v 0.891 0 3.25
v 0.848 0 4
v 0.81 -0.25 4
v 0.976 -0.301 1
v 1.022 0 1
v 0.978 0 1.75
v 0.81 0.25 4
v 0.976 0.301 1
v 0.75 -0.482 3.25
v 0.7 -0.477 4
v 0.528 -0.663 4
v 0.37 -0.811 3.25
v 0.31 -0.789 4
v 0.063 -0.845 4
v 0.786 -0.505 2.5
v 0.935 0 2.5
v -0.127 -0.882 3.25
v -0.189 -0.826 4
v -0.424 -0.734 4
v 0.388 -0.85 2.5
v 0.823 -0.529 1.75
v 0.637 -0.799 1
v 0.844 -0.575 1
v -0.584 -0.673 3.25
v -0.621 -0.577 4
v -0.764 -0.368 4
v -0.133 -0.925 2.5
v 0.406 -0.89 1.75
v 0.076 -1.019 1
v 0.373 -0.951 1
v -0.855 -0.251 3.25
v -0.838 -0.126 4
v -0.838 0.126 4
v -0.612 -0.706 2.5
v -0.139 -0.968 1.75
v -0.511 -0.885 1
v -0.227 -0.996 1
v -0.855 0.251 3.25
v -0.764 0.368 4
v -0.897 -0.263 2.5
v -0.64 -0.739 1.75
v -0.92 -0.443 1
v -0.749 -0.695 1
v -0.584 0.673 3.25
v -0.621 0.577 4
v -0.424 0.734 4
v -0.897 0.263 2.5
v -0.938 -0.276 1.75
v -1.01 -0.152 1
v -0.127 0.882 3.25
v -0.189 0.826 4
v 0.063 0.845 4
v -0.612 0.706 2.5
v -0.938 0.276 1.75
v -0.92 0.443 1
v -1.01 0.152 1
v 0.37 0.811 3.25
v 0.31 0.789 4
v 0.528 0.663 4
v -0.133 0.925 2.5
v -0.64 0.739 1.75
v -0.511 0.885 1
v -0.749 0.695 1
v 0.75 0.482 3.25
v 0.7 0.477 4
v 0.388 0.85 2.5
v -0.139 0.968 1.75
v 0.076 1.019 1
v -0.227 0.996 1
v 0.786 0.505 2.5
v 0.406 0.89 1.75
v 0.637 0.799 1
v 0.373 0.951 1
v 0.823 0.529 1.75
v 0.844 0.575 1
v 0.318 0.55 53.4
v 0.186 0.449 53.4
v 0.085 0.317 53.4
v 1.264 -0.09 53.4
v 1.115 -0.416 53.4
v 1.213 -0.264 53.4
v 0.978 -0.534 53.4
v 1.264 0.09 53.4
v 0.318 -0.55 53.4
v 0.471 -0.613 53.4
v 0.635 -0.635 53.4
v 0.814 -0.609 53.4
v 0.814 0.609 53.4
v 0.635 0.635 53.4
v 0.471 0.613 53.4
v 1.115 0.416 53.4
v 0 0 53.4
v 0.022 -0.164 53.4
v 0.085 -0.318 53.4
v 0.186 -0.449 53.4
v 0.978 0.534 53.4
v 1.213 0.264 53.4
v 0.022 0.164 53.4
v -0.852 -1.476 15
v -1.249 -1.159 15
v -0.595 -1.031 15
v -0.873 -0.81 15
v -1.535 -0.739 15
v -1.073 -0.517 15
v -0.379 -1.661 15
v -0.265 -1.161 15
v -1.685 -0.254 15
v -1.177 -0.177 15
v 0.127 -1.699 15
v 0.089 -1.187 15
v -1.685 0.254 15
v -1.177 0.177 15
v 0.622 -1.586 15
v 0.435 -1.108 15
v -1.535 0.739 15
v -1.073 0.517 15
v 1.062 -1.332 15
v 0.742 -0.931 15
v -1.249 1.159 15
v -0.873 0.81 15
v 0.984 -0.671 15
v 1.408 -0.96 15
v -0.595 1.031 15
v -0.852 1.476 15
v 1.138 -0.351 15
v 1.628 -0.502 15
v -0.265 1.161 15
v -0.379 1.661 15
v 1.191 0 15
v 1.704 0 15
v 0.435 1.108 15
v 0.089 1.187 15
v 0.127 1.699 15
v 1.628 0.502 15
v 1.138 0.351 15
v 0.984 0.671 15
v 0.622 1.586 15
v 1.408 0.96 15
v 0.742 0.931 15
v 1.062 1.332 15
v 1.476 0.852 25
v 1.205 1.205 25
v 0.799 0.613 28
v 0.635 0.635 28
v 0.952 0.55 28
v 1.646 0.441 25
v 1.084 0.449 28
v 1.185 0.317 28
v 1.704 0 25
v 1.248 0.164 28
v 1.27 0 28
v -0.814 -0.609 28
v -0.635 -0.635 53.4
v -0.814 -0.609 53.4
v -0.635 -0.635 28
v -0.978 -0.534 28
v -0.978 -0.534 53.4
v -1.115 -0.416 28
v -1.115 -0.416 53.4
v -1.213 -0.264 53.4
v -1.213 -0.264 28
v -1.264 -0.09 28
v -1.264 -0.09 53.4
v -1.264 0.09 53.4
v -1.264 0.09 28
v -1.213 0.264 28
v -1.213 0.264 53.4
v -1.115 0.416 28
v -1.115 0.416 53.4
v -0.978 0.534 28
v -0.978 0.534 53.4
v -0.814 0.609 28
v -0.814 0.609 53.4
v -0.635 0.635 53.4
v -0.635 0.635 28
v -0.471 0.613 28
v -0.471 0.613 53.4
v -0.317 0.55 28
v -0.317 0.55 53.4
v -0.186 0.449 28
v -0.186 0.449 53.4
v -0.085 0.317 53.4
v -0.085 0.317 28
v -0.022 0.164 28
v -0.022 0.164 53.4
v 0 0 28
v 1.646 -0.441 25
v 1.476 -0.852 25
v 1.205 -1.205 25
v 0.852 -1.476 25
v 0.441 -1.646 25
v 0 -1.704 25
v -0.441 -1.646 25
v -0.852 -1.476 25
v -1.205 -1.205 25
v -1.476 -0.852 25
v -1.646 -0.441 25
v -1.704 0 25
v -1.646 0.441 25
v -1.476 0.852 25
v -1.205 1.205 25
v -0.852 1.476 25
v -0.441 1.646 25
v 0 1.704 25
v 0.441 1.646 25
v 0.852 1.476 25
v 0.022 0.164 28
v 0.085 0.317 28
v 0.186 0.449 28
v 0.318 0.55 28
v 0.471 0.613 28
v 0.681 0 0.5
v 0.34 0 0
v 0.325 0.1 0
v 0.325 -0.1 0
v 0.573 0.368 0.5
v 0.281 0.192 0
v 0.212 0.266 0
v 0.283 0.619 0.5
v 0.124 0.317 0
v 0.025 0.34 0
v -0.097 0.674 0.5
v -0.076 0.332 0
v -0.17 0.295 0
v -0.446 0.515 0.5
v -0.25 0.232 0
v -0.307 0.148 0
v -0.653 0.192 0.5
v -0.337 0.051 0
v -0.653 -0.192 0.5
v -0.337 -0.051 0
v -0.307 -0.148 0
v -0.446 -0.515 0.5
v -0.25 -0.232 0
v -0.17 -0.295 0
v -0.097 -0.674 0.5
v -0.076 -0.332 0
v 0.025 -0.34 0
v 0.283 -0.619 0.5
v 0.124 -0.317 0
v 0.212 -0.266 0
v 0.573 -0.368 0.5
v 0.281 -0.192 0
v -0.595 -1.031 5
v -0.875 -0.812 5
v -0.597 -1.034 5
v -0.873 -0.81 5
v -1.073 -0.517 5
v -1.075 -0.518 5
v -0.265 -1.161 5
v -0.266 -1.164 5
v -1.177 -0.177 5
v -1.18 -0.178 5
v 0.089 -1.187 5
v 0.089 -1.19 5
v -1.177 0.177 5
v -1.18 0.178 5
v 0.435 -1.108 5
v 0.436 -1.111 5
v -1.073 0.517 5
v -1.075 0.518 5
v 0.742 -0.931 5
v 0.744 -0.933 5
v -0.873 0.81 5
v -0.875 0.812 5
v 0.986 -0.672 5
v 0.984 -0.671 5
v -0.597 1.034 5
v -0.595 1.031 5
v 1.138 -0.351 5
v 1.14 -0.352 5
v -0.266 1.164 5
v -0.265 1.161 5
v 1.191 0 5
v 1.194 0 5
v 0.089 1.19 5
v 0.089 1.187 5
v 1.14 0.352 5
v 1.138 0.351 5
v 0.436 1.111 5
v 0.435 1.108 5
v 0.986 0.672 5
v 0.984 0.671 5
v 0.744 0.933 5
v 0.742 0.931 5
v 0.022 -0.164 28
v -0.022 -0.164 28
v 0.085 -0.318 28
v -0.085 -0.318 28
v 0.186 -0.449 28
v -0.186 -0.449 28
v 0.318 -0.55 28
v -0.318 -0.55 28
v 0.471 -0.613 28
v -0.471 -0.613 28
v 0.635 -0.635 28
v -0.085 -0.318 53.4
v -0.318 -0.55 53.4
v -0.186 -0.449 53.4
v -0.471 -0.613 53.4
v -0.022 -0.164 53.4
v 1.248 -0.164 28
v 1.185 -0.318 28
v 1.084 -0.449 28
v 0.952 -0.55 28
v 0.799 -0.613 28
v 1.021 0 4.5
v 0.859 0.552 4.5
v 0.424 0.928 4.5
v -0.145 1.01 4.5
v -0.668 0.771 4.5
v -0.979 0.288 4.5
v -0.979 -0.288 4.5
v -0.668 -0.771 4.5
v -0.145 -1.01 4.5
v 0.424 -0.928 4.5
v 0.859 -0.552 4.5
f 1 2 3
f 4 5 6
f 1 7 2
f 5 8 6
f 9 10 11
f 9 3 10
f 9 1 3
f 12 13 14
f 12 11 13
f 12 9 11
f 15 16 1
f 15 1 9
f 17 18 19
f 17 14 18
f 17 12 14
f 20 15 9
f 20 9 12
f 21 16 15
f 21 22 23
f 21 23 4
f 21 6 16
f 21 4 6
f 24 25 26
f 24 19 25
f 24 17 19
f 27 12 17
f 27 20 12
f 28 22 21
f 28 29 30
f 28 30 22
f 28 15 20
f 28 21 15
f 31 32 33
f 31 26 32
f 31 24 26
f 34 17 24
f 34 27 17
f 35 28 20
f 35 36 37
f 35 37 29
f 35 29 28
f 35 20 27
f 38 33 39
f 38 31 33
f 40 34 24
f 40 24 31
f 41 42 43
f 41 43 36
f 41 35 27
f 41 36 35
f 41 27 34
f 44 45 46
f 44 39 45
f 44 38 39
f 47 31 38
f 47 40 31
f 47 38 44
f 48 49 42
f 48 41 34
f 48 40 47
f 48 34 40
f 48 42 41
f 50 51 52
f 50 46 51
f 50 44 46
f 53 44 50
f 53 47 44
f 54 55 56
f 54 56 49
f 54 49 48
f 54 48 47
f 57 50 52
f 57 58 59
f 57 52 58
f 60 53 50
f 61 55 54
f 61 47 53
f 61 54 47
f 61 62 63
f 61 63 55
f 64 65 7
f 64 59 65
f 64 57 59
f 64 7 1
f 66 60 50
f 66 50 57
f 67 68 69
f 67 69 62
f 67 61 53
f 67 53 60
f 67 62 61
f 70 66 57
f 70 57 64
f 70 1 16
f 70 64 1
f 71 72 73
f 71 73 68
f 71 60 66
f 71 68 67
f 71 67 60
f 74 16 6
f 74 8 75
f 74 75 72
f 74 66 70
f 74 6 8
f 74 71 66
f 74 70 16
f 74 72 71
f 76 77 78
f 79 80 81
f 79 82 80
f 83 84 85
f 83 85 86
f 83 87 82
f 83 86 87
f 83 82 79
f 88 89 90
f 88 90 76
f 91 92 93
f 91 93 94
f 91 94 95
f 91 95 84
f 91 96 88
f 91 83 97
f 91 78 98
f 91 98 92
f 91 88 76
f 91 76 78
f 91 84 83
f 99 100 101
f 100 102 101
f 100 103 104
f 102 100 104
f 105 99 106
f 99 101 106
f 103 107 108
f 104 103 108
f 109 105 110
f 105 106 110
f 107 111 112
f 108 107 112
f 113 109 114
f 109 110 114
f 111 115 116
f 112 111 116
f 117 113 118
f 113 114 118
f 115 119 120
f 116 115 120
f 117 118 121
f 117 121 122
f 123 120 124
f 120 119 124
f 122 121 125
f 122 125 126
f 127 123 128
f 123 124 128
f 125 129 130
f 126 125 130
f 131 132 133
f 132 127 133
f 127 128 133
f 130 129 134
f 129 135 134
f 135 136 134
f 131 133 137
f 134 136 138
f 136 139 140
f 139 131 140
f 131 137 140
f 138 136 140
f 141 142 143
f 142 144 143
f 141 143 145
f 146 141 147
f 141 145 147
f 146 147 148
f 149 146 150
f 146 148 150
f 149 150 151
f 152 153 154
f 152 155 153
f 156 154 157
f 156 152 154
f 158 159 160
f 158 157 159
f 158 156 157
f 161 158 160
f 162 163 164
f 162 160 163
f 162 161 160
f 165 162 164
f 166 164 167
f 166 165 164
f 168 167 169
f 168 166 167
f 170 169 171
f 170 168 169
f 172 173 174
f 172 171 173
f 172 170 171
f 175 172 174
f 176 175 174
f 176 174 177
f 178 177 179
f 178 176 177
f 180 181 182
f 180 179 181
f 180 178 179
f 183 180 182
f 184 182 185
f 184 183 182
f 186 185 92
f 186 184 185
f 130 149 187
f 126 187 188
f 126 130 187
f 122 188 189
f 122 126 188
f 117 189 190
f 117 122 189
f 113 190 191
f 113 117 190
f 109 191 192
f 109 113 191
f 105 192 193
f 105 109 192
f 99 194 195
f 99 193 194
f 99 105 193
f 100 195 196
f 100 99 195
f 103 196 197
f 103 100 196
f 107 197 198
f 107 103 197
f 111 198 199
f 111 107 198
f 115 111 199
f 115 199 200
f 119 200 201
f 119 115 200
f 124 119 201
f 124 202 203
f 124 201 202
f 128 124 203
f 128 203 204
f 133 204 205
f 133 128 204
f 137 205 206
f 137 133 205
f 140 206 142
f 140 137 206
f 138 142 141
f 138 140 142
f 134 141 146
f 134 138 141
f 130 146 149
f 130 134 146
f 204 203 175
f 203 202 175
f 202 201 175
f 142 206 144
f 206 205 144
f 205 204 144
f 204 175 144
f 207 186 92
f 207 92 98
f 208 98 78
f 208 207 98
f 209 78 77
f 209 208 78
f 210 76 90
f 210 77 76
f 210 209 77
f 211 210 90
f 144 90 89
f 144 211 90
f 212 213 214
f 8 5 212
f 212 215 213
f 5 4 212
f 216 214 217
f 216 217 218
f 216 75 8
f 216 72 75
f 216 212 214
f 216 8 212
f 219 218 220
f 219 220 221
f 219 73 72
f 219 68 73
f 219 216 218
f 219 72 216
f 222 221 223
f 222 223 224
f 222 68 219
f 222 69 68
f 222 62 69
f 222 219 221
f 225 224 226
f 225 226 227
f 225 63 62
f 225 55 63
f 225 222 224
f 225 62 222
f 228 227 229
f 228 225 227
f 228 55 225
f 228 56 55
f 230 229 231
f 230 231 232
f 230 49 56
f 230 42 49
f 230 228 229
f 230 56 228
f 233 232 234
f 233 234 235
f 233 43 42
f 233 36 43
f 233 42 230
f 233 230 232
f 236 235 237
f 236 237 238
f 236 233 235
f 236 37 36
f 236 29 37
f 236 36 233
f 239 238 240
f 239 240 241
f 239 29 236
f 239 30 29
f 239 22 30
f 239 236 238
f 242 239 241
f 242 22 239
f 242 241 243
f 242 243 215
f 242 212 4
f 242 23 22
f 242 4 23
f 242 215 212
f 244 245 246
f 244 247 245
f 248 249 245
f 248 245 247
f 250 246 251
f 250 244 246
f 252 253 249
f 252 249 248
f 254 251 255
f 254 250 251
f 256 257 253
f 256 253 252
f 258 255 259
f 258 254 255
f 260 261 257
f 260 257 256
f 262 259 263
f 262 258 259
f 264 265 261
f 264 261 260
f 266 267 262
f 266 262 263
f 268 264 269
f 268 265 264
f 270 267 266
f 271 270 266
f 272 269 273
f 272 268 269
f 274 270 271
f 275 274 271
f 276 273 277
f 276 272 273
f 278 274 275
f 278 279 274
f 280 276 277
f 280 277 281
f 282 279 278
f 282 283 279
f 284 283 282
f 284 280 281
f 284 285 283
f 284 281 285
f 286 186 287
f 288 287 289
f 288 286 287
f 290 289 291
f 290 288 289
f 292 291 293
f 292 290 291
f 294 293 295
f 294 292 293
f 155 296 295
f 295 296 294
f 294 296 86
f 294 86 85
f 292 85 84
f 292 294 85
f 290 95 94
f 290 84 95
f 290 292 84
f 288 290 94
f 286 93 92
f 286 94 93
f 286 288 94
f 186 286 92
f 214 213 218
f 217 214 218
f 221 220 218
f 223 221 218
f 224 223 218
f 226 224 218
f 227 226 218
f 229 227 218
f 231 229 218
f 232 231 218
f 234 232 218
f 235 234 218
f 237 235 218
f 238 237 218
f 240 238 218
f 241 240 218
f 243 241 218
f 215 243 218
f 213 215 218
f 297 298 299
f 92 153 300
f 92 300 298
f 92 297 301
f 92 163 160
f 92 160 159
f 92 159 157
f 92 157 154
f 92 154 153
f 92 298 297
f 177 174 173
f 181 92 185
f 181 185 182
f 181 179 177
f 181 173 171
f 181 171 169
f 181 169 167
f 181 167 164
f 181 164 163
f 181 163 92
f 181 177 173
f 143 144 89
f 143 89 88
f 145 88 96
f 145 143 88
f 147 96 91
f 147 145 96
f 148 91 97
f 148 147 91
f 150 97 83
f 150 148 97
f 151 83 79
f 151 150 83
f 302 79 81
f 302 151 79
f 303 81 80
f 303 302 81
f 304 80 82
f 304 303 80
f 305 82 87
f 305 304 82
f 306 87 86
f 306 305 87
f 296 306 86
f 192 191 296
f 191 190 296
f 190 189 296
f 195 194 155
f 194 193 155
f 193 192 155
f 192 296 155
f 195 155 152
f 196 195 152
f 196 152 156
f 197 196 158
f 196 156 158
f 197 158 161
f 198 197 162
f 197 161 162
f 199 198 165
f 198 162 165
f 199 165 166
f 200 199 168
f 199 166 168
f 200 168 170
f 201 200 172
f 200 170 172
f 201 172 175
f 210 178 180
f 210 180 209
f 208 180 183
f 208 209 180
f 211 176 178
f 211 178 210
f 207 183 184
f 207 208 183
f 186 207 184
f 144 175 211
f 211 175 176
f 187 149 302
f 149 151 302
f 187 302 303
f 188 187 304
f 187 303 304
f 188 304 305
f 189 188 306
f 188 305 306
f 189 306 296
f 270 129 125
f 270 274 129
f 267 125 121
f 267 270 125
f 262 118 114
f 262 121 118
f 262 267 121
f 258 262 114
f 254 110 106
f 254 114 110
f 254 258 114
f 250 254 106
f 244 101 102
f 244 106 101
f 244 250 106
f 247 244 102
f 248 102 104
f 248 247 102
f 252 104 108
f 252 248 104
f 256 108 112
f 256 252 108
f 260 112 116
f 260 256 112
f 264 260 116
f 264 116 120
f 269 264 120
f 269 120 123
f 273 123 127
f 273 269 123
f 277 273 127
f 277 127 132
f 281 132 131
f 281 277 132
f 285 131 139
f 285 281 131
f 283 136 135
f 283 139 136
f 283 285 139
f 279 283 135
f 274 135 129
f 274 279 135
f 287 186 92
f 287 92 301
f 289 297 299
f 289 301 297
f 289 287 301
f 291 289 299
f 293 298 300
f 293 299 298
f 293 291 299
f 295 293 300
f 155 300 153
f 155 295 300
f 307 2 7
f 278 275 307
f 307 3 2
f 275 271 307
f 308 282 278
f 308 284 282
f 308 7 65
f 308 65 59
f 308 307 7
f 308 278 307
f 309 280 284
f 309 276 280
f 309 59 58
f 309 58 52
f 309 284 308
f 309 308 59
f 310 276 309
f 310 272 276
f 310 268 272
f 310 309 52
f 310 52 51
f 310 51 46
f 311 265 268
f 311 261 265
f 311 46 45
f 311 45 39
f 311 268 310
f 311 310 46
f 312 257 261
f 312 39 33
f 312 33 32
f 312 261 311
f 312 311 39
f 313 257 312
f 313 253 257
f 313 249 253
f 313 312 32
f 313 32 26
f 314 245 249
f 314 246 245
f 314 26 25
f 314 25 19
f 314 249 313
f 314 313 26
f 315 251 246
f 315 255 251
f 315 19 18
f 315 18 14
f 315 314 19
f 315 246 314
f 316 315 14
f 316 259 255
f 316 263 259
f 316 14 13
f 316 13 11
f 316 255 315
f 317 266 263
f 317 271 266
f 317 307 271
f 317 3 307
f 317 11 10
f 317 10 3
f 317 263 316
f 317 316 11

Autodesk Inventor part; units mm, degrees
ref_plane "YZ Plane" through (0, 0, 0) normal (1, 0, 0) x (0, 1, 0)
sketch "Sketch1" plane through (0, 0, 0) normal (0, 0, 1) x (1, 0, 0)
  circle A0 centre (0, 0) radius 0.3405
  dimension "d0" = 0.681
ref_plane "Work Plane1" through (0, 0, 1) normal (0, 0, 1) x (1, 0, 0)
sketch "Sketch2" plane through (0, 0, 1) normal (0, 0, 1) x (1, 0, 0)
  circle A0 centre (0, 0) radius 1.0215
  dimension "d2" = 2.043
ref_plane "Work Plane2" through (0, 0, 4) normal (0, 0, 1) x (1, 0, 0)
sketch "Sketch3" plane through (0, 0, 4) normal (0, 0, 1) x (1, 0, 0)
  circle A0 centre (0, 0) radius 0.8476
  dimension "d4" = 1.6951
ref_plane "Work Plane3" through (0, 0, 5) normal (0, 0, 1) x (1, 0, 0)
sketch "Sketch4" plane through (0, 0, 5) normal (0, 0, 1) x (1, 0, 0)
  circle A0 centre (0, 0) radius 1.1935
  dimension "d6" = 2.387
loft "Loft1" add profiles "Sketch4", "Sketch3"
loft "Loft2" add profiles "Sketch2" section 1 edges at (-0.8476, 0, 4)
loft "Loft3" add profiles "Sketch1" section 2 edges at (-1.0215, 0, 1)
sketch "Sketch5" plane through (0, 0, 5) normal (0, 0, 1) x (1, 0, 0)
  circle A0 centre (0, 0) radius 1.1906
  dimension "d35" = 2.3813
extrude "Extrusion1" add sketch "Sketch5" along normal blind 10
sketch "Sketch6" plane through (0, 0, 15) normal (0, 0, 1) x (1, 0, 0)
  circle A0 centre (0, 0) radius 1.7038
  dimension "d21" = 3.4076
extrude "Extrusion2" add sketch "Sketch6" along normal blind 10
ref_plane "Work Plane4" through (0, 0, 28) normal (0, 0, 1) x (1, 0, 0)
sketch "Sketch7" plane through (0, 0, 28) normal (0, 0, 1) x (1, 0, 0)
  arc A0 (-0.635, 0.635) -> (-0.635, -0.635) centre (-0.635, 0) ccw
  arc A1 (0.635, -0.635) -> (0.635, 0.635) centre (0.635, 0) ccw
  line L0 (-0.635, 0.635) -> (0.635, 0.635)
  line L1 (0.635, -0.635) -> (-0.635, -0.635)
loft "Loft4" add profiles "Sketch7" section 1 edges at (-1.7038, 0, 25)
sketch "Sketch8" plane through (0, 0, 28) normal (0, 0, 1) x (1, 0, 0)
  arc A0 (-0.635, 0.635) -> (-0.635, -0.635) centre (-0.635, 0) ccw projected
  circle A1 centre (-0.635, 0) radius 0.635
  arc A2 (0.635, -0.635) -> (0.635, 0.635) centre (0.635, 0) ccw projected
  circle A3 centre (0.635, 0) radius 0.635
  point P0 (0, 0)
extrude "Extrusion3" add sketch "Sketch8" along normal blind 25.4
properties part number "Male End Audio Jack"
